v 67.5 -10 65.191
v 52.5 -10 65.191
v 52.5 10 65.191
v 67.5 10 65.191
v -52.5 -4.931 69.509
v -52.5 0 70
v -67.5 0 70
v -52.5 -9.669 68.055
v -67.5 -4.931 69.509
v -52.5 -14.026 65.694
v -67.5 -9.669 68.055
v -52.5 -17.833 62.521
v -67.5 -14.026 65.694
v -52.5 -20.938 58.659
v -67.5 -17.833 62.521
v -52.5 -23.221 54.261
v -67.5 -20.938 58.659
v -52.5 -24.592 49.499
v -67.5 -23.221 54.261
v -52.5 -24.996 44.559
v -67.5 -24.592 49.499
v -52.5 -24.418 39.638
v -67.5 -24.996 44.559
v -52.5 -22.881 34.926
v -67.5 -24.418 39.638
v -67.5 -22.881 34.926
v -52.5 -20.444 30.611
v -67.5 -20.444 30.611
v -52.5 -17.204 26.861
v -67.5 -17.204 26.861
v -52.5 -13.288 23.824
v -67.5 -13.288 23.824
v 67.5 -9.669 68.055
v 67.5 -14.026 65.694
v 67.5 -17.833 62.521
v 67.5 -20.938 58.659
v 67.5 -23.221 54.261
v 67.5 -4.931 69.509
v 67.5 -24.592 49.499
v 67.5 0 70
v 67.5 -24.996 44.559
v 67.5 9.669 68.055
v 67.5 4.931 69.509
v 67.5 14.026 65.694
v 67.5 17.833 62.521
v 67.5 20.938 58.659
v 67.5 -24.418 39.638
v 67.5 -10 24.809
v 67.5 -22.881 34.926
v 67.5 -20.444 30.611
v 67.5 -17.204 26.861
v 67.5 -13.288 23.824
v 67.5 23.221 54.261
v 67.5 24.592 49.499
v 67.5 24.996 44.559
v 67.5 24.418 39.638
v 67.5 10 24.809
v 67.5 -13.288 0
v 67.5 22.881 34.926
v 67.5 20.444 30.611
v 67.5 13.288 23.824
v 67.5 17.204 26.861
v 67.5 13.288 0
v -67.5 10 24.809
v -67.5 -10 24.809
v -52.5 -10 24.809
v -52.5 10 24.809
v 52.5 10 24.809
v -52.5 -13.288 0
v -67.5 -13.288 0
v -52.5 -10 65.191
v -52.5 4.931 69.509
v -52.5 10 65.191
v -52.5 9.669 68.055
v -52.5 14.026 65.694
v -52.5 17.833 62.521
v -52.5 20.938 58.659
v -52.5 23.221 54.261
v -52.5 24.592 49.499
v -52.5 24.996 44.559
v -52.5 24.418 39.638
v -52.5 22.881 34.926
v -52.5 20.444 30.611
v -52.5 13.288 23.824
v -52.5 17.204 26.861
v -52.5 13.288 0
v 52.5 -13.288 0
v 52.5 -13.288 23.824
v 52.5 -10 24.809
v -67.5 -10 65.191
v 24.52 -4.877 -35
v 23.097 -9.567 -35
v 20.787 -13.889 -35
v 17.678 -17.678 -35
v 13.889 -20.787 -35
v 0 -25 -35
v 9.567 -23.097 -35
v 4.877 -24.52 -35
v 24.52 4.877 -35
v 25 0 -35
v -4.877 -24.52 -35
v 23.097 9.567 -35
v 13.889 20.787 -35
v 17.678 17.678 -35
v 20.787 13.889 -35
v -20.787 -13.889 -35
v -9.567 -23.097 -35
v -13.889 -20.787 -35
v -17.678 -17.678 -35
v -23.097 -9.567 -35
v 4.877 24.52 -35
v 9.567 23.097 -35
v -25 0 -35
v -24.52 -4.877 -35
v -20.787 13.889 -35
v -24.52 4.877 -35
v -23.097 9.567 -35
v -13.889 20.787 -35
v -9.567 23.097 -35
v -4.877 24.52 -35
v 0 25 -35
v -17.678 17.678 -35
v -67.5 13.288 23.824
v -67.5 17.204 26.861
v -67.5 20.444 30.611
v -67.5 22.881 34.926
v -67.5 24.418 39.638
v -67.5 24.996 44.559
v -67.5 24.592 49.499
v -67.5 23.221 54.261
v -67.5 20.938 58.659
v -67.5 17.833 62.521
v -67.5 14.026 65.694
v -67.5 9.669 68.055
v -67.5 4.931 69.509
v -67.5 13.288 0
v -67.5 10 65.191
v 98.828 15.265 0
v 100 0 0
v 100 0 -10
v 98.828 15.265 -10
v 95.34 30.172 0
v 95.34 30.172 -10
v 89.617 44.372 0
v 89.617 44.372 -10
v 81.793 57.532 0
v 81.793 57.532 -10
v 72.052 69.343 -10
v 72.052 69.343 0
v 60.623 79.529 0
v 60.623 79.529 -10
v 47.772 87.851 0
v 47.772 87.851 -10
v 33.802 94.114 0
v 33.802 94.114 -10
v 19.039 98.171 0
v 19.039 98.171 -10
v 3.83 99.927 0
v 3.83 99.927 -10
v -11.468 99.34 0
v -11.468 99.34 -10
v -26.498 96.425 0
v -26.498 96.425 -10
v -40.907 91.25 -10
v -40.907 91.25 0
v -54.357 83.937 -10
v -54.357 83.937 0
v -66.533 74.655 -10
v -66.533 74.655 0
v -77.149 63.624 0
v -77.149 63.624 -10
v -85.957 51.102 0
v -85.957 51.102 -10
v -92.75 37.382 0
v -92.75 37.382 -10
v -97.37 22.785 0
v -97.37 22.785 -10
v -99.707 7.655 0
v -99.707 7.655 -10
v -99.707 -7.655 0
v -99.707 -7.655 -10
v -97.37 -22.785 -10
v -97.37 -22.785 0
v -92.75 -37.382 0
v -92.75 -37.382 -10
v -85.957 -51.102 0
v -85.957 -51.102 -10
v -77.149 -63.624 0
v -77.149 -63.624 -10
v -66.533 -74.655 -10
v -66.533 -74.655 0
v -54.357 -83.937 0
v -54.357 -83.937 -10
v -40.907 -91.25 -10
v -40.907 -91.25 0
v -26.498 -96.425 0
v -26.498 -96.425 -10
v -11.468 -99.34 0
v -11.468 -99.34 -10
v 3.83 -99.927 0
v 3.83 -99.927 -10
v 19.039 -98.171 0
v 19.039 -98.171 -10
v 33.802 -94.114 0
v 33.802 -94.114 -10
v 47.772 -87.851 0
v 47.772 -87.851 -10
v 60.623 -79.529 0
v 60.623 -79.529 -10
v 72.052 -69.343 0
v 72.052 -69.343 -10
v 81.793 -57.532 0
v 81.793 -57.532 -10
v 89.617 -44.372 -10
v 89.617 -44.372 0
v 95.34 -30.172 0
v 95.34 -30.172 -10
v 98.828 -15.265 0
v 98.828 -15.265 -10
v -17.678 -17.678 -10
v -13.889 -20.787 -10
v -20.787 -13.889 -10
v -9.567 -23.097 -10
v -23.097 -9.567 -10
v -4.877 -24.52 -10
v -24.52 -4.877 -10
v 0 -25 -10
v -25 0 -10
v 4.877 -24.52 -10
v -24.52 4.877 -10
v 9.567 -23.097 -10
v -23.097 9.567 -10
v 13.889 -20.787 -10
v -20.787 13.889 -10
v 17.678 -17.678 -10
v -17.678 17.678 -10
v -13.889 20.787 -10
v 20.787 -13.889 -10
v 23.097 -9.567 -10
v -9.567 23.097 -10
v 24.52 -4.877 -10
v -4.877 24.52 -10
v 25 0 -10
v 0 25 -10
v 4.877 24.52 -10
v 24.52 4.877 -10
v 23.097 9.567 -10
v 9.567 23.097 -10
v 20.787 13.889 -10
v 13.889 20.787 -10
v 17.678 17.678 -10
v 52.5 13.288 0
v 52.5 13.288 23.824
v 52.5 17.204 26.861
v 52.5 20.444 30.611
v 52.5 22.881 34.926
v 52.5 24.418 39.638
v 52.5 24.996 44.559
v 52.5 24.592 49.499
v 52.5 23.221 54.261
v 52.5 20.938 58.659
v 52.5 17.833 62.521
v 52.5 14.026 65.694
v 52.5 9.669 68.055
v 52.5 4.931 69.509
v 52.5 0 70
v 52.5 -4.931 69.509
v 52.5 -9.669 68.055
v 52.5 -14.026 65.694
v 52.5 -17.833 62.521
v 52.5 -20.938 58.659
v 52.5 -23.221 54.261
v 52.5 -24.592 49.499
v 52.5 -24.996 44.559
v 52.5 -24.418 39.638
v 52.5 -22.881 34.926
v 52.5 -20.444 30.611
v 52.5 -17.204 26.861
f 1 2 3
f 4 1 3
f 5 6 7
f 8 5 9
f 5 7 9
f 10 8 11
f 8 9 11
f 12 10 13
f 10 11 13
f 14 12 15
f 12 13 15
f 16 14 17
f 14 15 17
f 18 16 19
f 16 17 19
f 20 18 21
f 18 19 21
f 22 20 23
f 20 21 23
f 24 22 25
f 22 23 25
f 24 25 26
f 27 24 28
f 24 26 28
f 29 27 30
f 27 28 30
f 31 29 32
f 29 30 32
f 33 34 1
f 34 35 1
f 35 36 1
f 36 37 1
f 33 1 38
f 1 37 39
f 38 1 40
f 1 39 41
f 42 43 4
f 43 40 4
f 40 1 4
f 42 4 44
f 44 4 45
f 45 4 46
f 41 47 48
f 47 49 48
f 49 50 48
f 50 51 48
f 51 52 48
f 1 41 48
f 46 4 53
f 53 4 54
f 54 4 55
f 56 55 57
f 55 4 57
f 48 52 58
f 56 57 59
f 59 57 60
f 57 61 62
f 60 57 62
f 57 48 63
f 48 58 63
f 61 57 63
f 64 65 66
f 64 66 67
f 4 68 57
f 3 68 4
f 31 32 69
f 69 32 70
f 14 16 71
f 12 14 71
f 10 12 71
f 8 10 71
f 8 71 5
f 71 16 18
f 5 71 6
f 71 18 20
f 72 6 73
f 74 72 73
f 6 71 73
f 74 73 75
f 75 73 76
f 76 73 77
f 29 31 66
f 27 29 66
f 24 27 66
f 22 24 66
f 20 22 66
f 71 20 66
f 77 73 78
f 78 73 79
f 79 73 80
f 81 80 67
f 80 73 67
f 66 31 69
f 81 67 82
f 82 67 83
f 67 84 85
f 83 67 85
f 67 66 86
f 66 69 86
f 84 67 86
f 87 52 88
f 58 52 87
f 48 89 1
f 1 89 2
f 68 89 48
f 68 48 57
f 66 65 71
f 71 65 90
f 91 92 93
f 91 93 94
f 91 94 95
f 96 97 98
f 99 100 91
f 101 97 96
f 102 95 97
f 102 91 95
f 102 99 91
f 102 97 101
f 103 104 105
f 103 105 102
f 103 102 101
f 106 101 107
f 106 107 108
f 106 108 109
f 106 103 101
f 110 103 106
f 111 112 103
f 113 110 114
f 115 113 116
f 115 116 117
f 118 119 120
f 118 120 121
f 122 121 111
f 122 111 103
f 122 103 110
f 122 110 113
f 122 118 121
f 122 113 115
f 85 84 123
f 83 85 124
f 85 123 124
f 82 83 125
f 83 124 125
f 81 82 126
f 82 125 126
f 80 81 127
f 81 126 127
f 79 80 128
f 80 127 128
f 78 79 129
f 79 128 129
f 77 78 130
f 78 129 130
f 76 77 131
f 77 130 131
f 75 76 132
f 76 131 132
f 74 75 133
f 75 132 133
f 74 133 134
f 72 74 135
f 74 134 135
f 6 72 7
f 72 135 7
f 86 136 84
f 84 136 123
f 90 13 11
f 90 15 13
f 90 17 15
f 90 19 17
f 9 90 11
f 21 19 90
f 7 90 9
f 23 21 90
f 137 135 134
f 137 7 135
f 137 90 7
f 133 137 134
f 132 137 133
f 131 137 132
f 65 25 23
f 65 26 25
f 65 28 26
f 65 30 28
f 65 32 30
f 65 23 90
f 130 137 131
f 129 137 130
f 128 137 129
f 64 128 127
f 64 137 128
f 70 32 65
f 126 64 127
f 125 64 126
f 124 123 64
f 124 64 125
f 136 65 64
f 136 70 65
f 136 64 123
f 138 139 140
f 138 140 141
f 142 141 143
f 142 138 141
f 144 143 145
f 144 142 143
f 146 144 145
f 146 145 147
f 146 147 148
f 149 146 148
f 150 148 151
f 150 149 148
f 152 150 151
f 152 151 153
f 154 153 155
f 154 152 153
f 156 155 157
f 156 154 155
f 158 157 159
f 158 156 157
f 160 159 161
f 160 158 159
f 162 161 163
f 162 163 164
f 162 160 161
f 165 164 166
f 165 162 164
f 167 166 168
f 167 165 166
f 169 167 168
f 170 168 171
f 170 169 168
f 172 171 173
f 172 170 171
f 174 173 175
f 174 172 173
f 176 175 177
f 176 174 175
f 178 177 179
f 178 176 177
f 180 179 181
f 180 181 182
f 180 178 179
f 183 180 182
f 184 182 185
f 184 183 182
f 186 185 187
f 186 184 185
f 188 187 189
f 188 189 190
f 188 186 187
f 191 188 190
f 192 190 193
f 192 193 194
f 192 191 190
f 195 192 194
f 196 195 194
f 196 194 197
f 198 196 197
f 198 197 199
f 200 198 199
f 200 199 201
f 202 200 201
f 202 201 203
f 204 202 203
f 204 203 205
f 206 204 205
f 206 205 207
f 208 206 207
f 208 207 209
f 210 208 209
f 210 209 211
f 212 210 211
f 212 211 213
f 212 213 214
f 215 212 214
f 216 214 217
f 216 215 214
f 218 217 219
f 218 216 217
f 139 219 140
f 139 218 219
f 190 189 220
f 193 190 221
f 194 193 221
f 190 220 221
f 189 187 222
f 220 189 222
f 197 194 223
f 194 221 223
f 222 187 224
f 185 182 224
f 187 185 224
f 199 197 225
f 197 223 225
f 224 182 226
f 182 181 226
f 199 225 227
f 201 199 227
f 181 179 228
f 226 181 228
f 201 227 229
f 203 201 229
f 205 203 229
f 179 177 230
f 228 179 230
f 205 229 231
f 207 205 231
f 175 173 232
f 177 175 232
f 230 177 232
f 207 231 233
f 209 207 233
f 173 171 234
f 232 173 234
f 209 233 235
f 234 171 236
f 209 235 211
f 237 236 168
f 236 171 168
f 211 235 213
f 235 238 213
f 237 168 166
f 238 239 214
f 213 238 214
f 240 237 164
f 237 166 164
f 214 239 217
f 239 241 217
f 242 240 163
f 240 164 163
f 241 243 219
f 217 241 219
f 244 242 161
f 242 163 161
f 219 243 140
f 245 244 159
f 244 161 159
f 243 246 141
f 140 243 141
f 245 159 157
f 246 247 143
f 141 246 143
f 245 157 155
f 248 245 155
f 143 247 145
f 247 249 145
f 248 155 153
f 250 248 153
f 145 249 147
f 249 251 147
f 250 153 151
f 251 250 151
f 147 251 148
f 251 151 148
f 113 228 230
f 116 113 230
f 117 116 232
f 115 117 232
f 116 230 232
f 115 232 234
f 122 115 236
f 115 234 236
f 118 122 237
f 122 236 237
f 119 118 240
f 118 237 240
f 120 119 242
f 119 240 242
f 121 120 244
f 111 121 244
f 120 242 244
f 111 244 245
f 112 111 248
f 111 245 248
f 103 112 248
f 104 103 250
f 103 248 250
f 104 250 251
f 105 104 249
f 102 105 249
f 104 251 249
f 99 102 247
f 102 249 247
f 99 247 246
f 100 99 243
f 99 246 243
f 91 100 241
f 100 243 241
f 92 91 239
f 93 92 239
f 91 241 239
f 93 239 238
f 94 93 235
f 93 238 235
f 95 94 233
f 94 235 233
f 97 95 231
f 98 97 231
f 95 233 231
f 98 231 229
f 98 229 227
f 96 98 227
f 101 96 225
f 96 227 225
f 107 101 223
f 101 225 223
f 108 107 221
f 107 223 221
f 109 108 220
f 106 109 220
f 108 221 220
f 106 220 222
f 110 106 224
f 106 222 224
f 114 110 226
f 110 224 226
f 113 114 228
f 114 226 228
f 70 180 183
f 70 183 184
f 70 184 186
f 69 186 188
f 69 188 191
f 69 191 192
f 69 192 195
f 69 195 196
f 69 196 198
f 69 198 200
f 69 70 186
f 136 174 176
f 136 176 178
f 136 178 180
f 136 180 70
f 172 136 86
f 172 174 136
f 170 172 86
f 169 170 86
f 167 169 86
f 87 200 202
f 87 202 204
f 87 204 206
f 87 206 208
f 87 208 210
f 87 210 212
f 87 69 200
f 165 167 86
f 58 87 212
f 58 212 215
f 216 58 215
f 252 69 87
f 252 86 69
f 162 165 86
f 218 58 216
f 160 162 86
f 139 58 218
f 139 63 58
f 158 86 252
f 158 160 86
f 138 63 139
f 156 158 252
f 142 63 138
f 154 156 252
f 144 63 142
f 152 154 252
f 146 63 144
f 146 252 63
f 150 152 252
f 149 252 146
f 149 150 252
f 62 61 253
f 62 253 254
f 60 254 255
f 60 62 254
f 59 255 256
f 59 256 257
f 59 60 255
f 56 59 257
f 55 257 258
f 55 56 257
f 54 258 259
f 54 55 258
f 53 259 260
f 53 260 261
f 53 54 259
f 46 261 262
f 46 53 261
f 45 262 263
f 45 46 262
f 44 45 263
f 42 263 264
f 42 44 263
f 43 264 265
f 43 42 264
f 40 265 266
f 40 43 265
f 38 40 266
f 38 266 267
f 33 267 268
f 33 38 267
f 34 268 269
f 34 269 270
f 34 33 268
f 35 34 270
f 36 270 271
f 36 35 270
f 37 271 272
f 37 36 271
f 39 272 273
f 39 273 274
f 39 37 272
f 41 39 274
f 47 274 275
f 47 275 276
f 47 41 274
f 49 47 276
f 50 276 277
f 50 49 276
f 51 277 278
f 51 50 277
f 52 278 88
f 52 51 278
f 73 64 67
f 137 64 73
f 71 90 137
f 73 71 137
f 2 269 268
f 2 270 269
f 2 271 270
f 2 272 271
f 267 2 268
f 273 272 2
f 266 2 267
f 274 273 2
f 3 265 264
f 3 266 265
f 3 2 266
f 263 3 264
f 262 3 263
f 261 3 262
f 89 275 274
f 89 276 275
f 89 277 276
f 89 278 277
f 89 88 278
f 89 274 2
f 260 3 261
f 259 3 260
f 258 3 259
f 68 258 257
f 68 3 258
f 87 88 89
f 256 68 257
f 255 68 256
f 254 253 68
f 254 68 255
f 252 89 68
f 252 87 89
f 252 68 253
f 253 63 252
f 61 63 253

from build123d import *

# Parameters (mm, degrees)
SKETCH1_R           = 100
BOSS_EXTRUDE1_DEPTH = 10
SKETCH2_R           = 25
BOSS_EXTRUDE2_DEPTH = 25
SKETCH3_W           = 15
SKETCH3_H           = 80
BOSS_EXTRUDE3_DEPTH = 70
CUT_EXTRUDE1_DEPTH  = 40
SKETCH7_W           = 40.381813508
SKETCH7_H           = 20
CUT_EXTRUDE2_DEPTH  = 208.25889607


with BuildPart() as part:
    # Sketch1 → Boss-Extrude1 (new body)
    with BuildSketch(Plane.XY):
        Circle(SKETCH1_R)
    extrude(amount=-BOSS_EXTRUDE1_DEPTH)

    # Sketch2 → Boss-Extrude2 (add)
    with BuildSketch(Plane(origin=(0, 0, -10), x_dir=(-1, 0, 0), z_dir=(0, 0, -1))):
        Circle(SKETCH2_R)
    extrude(amount=BOSS_EXTRUDE2_DEPTH)

    # Sketch3 → Boss-Extrude3 (add)
    with BuildSketch(Plane.XY):
        with Locations((-60, 0)):
            Rectangle(SKETCH3_W, SKETCH3_H)
    boss_extrude3 = extrude(amount=BOSS_EXTRUDE3_DEPTH)

    # Sketch5 → Cut-Extrude1 (cut)
    with BuildSketch(Plane.ZY.offset(67.5)):
        with BuildLine():
            Line((70, 0), (70, 40))
            Line((70, 40), (0, 40))
            Line((0, 40), (0, 13.288234805))
            Line((0, 13.288234805), (23.824003784, 13.288234805))
            ThreePointArc((23.824003784, 13.288234805), (51.913757827, 24.024986008), (70, 0))
        make_face()
        with BuildLine():
            Line((70, -40), (70, 0))
            ThreePointArc((70, 0), (51.913757827, -24.024986008), (23.824003784, -13.288234805))
            Line((23.824003784, -13.288234805), (0, -13.288234805))
            Line((0, -13.288234805), (0, -40))
            Line((0, -40), (70, -40))
        make_face()
    cut_extrude1 = extrude(amount=-CUT_EXTRUDE1_DEPTH, mode=Mode.SUBTRACT)

    # Mirror2: Boss-Extrude3, Cut-Extrude1 across plane
    add(boss_extrude3.mirror(Plane(origin=(0, 0, 0), x_dir=(0, 0, 1), z_dir=(1, 0, 0))))
    add(cut_extrude1.mirror(Plane(origin=(0, 0, 0), x_dir=(0, 0, 1), z_dir=(1, 0, 0))), mode=Mode.SUBTRACT)

    # Sketch7 → Cut-Extrude2 (cut, through all)
    with BuildSketch(Plane.ZY.offset(67.5)):
        with Locations((45, 0)):
            Rectangle(SKETCH7_W, SKETCH7_H)
    extrude(amount=-CUT_EXTRUDE2_DEPTH, mode=Mode.SUBTRACT)


solid = part.part
